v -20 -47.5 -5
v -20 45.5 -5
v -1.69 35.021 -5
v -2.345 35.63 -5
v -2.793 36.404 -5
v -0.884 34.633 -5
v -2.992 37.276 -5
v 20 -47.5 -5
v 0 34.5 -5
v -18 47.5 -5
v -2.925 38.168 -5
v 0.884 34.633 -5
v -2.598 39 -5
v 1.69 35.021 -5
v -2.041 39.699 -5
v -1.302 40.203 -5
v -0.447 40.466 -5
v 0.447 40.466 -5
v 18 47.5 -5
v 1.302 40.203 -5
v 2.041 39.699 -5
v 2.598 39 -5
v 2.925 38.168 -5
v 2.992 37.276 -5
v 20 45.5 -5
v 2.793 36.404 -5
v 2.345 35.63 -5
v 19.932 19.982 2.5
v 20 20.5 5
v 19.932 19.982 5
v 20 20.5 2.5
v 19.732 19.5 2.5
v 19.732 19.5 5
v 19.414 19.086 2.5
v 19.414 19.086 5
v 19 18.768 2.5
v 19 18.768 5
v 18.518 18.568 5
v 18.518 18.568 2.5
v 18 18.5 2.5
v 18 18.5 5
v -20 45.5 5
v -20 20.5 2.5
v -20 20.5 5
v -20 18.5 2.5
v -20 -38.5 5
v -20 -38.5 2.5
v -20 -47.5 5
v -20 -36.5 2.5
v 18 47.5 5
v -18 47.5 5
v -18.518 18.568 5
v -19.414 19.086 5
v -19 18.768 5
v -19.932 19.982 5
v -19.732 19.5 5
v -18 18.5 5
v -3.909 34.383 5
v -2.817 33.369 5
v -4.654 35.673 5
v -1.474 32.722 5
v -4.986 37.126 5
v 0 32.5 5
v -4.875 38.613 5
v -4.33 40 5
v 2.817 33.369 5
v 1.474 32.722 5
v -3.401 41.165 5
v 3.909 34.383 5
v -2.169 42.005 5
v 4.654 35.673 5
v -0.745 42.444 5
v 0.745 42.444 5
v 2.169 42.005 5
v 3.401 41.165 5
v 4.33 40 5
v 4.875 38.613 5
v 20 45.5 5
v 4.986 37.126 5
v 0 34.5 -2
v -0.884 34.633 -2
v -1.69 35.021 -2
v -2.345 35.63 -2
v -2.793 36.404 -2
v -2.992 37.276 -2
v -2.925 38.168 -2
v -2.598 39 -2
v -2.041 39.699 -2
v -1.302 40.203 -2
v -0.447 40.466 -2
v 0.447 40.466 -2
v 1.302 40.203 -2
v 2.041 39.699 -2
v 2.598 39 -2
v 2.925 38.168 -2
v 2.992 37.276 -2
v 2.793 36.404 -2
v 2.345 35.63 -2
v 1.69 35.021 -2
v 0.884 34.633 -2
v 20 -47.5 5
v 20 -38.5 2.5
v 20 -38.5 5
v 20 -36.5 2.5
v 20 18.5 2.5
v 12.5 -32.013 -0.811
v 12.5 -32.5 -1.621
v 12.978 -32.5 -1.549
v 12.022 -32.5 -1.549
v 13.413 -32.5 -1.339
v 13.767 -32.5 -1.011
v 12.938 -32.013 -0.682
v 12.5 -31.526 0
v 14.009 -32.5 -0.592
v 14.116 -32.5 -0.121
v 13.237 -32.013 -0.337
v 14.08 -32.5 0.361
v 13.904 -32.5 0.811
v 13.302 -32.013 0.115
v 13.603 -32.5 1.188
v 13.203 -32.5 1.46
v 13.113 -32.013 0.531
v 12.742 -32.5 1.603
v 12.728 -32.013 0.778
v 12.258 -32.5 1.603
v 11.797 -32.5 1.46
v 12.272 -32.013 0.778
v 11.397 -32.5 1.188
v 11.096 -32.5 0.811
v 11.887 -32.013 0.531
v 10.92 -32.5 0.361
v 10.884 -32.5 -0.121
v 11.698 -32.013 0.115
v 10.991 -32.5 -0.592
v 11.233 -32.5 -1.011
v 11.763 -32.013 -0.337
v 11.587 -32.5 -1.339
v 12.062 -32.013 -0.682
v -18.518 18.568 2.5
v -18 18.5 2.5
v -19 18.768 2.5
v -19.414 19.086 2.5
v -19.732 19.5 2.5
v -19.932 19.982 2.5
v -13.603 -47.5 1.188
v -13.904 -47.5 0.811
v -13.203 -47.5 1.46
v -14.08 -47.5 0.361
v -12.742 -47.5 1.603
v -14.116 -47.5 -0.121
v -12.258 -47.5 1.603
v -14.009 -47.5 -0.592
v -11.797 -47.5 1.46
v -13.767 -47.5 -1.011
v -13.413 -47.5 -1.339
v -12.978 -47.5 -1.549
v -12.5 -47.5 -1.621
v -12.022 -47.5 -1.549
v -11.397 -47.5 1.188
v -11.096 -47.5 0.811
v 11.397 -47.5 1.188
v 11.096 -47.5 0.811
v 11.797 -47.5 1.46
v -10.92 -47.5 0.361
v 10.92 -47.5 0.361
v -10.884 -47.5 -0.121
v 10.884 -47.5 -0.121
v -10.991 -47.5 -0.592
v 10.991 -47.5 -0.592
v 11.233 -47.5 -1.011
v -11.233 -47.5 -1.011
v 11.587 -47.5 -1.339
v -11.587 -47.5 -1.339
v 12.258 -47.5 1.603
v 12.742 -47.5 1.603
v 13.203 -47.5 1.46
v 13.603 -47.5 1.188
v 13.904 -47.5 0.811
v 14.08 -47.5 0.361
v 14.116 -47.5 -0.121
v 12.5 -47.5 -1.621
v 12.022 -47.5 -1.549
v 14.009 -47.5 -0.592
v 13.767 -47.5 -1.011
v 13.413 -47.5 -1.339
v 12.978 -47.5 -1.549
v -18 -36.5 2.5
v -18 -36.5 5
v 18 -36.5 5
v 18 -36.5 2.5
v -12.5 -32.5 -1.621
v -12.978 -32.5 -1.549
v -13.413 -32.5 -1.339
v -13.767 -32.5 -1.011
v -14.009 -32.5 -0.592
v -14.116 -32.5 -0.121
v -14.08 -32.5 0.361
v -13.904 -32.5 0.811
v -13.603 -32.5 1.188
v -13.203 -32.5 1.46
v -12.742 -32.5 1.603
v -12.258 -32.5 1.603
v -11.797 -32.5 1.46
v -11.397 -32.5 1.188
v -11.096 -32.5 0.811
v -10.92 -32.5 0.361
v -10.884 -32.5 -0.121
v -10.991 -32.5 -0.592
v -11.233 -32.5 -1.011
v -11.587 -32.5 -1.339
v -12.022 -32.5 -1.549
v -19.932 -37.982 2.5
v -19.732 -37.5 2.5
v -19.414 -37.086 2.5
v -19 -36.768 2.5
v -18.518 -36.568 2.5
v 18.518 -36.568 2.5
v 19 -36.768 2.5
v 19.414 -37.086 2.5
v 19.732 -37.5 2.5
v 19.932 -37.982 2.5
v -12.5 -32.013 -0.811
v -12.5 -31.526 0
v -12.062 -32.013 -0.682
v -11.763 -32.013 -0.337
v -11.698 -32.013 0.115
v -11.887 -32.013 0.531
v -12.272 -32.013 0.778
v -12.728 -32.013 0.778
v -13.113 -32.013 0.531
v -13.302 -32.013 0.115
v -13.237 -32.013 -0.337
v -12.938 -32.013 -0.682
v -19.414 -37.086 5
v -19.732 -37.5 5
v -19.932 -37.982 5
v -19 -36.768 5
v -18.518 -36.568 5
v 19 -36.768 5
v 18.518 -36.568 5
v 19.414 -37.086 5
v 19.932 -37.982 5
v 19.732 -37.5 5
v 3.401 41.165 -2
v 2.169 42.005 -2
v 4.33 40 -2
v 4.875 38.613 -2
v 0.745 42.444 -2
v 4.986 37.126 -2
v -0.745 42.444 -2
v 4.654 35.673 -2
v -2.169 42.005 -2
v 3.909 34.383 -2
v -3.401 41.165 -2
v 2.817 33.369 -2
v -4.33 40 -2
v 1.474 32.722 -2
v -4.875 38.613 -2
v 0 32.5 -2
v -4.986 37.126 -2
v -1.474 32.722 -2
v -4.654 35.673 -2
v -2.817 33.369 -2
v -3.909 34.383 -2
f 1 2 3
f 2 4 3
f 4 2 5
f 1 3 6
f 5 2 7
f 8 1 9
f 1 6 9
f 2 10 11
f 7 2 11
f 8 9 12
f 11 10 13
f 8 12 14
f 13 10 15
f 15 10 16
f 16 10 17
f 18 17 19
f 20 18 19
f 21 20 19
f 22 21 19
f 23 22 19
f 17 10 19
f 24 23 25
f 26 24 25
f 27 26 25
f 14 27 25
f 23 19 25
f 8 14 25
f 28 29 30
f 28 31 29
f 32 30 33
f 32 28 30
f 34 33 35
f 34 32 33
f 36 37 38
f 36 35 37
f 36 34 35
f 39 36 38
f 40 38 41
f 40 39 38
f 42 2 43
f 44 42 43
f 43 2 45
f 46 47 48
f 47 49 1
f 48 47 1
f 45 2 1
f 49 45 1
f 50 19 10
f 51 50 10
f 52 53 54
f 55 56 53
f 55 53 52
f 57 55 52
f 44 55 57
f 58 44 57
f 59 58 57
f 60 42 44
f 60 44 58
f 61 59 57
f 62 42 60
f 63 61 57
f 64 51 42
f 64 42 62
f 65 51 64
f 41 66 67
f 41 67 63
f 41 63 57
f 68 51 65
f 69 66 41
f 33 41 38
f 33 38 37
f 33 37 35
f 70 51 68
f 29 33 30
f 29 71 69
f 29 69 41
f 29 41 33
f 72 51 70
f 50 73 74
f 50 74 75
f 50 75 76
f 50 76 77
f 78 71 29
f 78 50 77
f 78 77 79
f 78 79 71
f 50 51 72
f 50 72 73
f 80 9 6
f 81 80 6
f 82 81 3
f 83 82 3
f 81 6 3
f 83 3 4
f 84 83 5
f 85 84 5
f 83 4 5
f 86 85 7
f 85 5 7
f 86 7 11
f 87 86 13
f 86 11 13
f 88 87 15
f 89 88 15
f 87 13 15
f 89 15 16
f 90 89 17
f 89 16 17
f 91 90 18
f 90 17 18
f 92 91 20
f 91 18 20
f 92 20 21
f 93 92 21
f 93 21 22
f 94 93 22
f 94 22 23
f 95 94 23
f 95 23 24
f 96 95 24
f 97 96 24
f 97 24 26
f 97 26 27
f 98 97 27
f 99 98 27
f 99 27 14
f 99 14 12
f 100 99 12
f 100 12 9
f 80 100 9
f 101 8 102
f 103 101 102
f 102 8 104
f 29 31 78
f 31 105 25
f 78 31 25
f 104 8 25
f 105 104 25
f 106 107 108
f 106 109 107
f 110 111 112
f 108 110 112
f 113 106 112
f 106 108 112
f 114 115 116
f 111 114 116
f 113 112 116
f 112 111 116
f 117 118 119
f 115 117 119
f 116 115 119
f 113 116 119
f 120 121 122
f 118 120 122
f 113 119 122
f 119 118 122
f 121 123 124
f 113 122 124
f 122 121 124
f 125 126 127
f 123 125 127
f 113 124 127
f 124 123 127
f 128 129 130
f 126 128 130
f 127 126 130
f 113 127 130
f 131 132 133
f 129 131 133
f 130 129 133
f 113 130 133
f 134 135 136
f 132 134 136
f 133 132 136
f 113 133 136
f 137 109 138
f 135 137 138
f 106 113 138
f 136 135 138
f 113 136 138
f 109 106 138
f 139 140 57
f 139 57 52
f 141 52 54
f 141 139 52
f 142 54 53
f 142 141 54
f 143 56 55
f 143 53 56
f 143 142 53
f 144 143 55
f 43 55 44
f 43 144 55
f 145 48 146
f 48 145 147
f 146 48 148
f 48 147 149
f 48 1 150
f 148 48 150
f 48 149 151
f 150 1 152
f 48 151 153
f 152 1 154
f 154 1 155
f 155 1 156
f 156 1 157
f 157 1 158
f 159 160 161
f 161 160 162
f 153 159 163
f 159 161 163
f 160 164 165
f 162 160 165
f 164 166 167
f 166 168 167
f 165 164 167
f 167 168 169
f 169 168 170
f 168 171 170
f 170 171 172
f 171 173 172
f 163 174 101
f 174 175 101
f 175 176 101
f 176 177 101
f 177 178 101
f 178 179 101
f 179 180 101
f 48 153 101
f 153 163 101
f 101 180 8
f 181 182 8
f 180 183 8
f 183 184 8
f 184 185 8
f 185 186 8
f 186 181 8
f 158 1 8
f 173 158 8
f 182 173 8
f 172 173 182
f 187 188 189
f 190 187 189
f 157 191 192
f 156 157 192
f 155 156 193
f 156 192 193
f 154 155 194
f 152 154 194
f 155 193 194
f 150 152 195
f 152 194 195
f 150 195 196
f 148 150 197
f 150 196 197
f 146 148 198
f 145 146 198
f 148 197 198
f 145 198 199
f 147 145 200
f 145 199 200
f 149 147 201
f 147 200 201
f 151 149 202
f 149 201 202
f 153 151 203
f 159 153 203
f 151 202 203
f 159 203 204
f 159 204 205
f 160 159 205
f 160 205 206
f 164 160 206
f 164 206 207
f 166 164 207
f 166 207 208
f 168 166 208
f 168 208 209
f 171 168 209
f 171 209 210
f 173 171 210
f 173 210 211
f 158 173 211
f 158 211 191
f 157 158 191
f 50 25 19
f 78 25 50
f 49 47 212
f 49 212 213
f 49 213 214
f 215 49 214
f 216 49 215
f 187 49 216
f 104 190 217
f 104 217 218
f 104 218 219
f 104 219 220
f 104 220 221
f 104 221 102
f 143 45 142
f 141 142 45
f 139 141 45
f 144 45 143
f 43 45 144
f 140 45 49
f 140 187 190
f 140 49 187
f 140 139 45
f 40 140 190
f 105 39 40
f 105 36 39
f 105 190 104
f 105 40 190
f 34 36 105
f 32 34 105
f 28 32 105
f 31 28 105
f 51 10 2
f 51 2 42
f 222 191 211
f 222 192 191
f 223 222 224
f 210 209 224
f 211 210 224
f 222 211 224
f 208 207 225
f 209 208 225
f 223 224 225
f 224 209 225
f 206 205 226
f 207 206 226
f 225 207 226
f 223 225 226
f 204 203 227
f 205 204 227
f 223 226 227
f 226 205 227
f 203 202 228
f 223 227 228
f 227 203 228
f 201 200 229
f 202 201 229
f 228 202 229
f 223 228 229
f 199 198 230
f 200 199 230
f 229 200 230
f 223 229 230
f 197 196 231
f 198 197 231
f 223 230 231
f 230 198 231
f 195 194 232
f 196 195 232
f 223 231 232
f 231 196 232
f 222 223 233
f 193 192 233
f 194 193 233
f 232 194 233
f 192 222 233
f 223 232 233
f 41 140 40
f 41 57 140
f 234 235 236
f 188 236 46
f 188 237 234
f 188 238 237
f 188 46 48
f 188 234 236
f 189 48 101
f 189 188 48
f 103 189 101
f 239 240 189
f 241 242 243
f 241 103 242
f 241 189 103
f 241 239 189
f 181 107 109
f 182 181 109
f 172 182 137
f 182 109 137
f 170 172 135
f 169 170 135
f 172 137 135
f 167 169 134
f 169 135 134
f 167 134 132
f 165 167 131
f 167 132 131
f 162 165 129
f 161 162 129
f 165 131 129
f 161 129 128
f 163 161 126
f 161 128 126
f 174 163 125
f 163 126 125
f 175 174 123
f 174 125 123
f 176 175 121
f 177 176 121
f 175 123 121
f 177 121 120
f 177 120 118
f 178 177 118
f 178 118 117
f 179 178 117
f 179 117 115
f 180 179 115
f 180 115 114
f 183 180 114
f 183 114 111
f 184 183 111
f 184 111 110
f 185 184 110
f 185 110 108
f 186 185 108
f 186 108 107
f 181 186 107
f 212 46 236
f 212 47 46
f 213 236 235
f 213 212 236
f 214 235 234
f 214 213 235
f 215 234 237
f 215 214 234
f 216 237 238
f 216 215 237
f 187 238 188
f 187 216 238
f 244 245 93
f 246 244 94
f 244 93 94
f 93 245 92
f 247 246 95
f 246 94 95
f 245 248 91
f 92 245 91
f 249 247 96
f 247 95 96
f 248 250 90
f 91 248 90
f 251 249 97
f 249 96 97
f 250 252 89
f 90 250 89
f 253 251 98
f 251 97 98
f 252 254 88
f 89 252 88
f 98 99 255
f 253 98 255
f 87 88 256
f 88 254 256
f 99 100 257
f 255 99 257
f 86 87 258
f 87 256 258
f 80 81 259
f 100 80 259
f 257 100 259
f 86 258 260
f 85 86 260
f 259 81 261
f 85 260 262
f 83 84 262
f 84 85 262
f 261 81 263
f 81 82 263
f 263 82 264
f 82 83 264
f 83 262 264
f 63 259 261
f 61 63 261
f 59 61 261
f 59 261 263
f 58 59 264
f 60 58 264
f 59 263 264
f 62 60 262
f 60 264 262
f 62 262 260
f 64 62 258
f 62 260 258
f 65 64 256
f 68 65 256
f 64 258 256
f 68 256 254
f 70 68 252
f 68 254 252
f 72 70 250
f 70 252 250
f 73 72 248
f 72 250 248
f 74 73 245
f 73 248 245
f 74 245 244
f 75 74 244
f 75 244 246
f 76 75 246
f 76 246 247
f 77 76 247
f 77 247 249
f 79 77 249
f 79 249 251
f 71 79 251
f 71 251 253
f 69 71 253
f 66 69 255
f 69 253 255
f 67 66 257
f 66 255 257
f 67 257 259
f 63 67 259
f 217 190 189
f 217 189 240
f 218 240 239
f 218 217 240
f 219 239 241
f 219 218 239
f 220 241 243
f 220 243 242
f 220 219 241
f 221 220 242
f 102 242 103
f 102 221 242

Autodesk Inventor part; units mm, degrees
ref_plane "YZ Plane" through (0, 0, 0) normal (1, 0, 0) x (0, 1, 0)
ref_plane "XZ Plane" through (0, 0, 0) normal (0, 1, 0) x (-1, 0, 0)
ref_plane "XY Plane" through (0, 0, 0) normal (0, 0, 1) x (1, 0, 0)
sketch "Esboço1" plane through (0, 0, 0) normal (0, 0, 1) x (1, 0, 0)
  line L0 (-20, -47.5) -> (20, -47.5)
  line L1 (20, -47.5) -> (20, 47.5)
  line L2 (20, 47.5) -> (-20, 47.5)
  line L3 (-20, 47.5) -> (-20, -47.5)
  line L4 (-20, 47.5) -> (20, 47.5)
  circle A0 centre (0, 37.5) radius 5
  circle A1 centre (0, 37.5) radius 27.5862 construction
  circle A2 centre (0, 37.5) radius 74 construction
  line L5 (-20, 18.5) -> (20, 18.5)
  line L6 (-20, -36.5) -> (20, -36.5)
  line L7 (-103.6, 0) -> (103.6, 0) construction
  line L8 (0, -79.3) -> (0, 143.3) construction
  point P0 (0, 0)
  dimension "d0" = 95
  dimension "d1" = 40
  dimension "d41" = 10
  dimension "d42" = 85
  dimension "d43" = 55.1725
  dimension "d45" = 84
  dimension "d49" = 66
extrude "Extrusão1" add sketch "Esboço1" along normal mid plane 10 contours L3 L6 L1 L0 | L3 L5 L1 L6 | L3 L2 L1 L5 | A0
extrude "Extrusão4" cut sketch "Esboço1" against normal blind 2.5 from surface at 5 contours L3 L5 L1 L6
sketch "Esboço2" plane through (-20, -47.5, -5) normal (0, -1, 0) x (1, 0, 0)
  line L0 (40, 10) -> (40, 0)
  line L1 (40, 5) -> (0, 5) construction
  line L2 (0, 0) -> (0, 10)
  line L3 (0, 0) -> (0, 10) projected
  line L4 (40, 0) -> (40, 10) projected
  line L5 (0, 10) -> (40, 10) construction
  line L6 (20, 10) -> (20, 0) construction
  line L7 (40, 0) -> (0, 0) construction
  point P0 (20, 5)
  point P1 (7.5, 5)
  point P2 (32.5, 5)
  dimension "d9" = 7.5
  dimension "d10" = 7.5
  dimension "d37" = 25
hole "Furo1" at (-12.5, -47.5, 0) at (12.5, -47.5, 0) direction (0, 1, 0) diameter 3.242 depth 15 tip angle 118 thread size "M4x0.7" class "6H" standard "ISO Metric profile"
sketch "Esboço3" plane through (0, 0, 5) normal (0, 0, 1) x (1, 0, 0)
  point P0 (0, 0)
  point P1 (0, 37.5)
  point P2 (0, 37.5)
hole "Furo2" at (0, 37.5, 5) direction (0, 0, -1) diameter 6 end through all counterbore diameter 10 counterbore depth 7
fillet "Arredondamento3" radius 2 4 edges at (-20, 18.5, 3.75) (20, 18.5, 3.75) (-20, -36.5, 3.75) (20, -36.5, 3.75)
chamfer "Chanfro2" distance 2 angle 45 2 edges at (-20, 47.5, 0) (20, 47.5, 0)
properties part number "GRJ-03-114" material "Fenolite OR"
